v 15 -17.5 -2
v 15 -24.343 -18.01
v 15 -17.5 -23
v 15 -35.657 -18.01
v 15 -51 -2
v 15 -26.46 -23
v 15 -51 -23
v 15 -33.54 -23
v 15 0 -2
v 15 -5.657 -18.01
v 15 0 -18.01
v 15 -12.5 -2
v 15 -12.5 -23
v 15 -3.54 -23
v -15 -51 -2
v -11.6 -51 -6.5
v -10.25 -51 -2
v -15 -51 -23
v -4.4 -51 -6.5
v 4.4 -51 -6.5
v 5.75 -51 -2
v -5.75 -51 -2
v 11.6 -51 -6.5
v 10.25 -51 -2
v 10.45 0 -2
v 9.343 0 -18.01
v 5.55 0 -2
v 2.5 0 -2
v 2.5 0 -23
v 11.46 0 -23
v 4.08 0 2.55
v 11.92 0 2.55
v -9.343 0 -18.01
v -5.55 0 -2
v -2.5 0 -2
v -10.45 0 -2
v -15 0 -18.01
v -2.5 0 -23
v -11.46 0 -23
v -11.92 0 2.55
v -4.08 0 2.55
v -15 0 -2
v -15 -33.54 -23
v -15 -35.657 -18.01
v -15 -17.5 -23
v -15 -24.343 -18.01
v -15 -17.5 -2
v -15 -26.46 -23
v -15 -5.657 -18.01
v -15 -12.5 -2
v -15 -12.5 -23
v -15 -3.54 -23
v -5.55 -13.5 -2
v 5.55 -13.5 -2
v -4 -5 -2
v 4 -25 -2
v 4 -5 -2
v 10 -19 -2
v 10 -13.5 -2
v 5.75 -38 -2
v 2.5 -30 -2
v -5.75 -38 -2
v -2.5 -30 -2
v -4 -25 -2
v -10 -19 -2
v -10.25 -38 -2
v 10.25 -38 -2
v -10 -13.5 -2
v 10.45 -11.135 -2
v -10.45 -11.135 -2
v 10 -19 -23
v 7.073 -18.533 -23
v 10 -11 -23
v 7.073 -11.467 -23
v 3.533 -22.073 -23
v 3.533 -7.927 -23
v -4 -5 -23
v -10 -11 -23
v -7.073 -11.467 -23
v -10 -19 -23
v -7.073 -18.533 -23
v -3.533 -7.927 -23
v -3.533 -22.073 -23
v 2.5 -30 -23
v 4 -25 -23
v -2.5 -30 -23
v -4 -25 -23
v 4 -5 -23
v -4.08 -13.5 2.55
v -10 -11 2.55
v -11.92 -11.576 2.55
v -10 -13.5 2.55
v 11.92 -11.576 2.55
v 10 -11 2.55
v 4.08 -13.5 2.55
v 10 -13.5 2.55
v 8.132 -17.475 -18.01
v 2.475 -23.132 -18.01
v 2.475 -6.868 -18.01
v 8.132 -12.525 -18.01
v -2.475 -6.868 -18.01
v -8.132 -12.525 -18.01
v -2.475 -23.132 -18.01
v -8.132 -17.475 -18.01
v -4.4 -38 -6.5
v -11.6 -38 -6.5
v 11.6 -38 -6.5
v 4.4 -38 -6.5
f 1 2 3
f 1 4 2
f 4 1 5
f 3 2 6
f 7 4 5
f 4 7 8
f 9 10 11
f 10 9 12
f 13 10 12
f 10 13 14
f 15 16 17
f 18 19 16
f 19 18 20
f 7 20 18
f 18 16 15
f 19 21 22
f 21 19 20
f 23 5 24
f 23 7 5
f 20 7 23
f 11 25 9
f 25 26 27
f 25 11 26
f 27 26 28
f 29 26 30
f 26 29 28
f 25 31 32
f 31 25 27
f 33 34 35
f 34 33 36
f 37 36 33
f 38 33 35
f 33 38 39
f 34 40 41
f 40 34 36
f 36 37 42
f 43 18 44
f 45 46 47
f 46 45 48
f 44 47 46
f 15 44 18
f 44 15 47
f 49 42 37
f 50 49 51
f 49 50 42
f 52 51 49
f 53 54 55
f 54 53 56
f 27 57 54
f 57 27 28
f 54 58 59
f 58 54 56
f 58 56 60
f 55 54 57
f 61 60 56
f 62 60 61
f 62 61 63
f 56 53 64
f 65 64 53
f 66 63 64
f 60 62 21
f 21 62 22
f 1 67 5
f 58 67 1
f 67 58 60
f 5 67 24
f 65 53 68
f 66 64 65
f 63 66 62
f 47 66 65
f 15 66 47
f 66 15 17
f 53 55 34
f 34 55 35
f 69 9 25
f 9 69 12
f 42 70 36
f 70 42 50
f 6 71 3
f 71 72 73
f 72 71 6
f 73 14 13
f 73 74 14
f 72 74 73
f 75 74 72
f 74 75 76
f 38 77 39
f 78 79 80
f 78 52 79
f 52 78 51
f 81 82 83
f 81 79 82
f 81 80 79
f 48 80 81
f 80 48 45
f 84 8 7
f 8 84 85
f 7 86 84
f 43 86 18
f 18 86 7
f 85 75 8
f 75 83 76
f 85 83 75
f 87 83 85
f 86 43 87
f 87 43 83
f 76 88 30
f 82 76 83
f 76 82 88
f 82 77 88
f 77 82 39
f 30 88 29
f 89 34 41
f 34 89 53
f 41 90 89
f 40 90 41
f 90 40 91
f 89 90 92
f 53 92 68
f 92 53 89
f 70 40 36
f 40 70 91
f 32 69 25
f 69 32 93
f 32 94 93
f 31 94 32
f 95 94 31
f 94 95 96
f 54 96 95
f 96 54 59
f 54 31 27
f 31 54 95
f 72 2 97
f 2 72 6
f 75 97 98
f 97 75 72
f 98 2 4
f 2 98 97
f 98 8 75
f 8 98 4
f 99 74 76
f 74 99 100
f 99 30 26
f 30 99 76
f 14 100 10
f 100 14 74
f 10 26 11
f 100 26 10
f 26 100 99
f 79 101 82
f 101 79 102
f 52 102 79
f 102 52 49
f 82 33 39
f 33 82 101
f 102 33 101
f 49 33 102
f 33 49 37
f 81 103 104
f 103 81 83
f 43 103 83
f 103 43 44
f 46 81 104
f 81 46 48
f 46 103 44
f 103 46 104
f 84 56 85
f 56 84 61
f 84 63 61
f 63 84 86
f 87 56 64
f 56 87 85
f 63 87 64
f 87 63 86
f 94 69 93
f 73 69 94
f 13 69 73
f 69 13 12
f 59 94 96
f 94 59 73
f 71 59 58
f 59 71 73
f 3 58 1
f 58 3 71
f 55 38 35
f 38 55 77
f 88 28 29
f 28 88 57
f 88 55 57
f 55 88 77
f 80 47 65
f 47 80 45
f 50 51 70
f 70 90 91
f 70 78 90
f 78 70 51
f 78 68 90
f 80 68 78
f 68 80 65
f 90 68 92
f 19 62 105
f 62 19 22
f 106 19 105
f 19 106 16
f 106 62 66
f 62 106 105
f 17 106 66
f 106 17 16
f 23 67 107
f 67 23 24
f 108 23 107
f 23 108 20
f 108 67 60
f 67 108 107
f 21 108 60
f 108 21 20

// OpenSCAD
// file: ../../include.scad
//////////////////      END SECTION       //////////////////

	module added_pins(){
		difference(){
			union(){
				translate([30/(15/4),obj_leg*leg_length,30/(15/4)]) pin();
				translate([30/(15/4)+14.5,obj_leg*leg_length,30/(15/4)+14]) pin();
			}
			union(){
							translate([30/(15/4)+13.5,obj_leg*leg_length-20,30/(15/4)+5])cube(size=[2,40,15]);
							translate([30/(15/4)+7.5,obj_leg*leg_length-20,30/(15/4)+15])rotate([0,90,0]) cube(size=[2,40,15]);	

							translate([30/(15/4)-1,obj_leg*leg_length-20,30/(15/4)-8])cube(size=[2,40,15]);
							translate([30/(15/4)-10,obj_leg*leg_length-20,30/(15/4)+1])rotate([0,90,0]) cube(size=[2,40,15]);
			}
		}
	}
	module taken_pins() {
		translate([30/(15/4)+14,obj_leg*leg_length-10,30/(15/4)]) mirror_pin();
		translate([30/(15/4),obj_leg*leg_length-10,30/(15/4)+15]) mirror_pin();
	}


//////////////////      OTHER STUFF       //////////////////

	module holes() {
		rotate([0,0,90]) for(y=[0:other_holes])
		translate([obj_leg+y*15,-15.5,7.5]) union() {
			translate([7.5,0,15]) hole_up();
			hole_down();
		}
	}
	module extend_holes() {
	module top(){
		rotate([0,0,90]) for(y=[0:other_holes+1])
		translate([(30/4)+y*15,-15.5,7.5]) union() {
			translate([7.5,0,15]) hole_up();
		}
	}
	module bottom(){
		rotate([0,0,90]) for(y=[0:other_holes+2])
		translate([(30/4)+y*15,-15.5,7.5]) union() {
			hole_down();
		
}
	}
	union(){
		top();
		bottom();
	}
	}

	module hole() {
		union() {
			rotate([90, 90, 0]) cylinder(h=40, d=hole_pin_diameter, center=true);
			translate([0,7.5,0]) sphere(d=hole_ball_size);
			translate([0,-6,0]) sphere(d=hole_ball_size);
		}
	}
	module hole_up() {
		union() {
			rotate([90, 90, 0]) cylinder(h=40, d=hole_pin_diameter, center=true);
			translate([0,7.5,10]) cylinder(h=hole_pin_height, d=hole_pin_diameter, center=true);
			translate([0,-6,10]) cylinder(h=hole_pin_height, d=hole_pin_diameter, center=true);
			translate([0,7.5,0]) sphere(d=hole_ball_size);
			translate([0,-6,0]) sphere(d=hole_ball_size);
		}
	}
	module hole_down() {
		union() {
			rotate([90, 90, 0]) cylinder(h=40, d=hole_pin_diameter, center=true);
			translate([0,7.5,-10]) cylinder(h=hole_pin_height, d=hole_pin_diameter, center=true);
			translate([0,-6,-10]) cylinder(h=hole_pin_height, d=hole_pin_diameter, center=true);
			translate([0,7.5,0]) sphere(d=hole_ball_size);
			translate([0,-6,0]) sphere(d=hole_ball_size);
		}
	}
	module pin() {
		union() {
			rotate([90, 90, 0]) cylinder(h=pin_height, d=pin_diameter, center=true);
			translate([0,7.5,0]) sphere(d=ball_size);
		}
	}

	module mirror_pin() {
		rotate([90, 90, 0]) cylinder(h=hole_pin_height+small_number, d=hole_pin_diameter, center=true);
		translate([0,-(pin_height-(ball_size/2)),0]) sphere(d=ball_size);
	}


//////////////////      SOME RACK AND Z THINGS       //////////////////

module z_holes() {
    rotate([0,-90,0]) for(z=[0:z_hole_number])
    translate([22.5+z*15,16,-12])
        hole();
}

module pin_cuts() {
	union(){
		cube(size=[2,10,40], center=true);
		rotate([0,0,90]) cube(size=[2,10,40], center=true);
	}
}
module pin_uncut() {
	union(){
		rotate([0, 0, 90]) cylinder(h=hole_pin_height, d=hole_pin_diameter, center=true);
		translate([0,0,10]) sphere(d=ball_hole);
	}
}


module pin_out() {
	union(){
		rotate([0, 0, 90]) cylinder(h=pin_height, d=pin_diameter, center=true);
		translate([0,0,10]) sphere(d= ball_size);
	}
}


module pins_z(){
	difference() {
		pin_out();
		pin_cuts();
	}
}
//////////////////      RACK AND SLIDE     ///////////////////

module straight_pins() {
	for(z=[0:((((obj_leg*leg_length)*2)-(obj_leg*2))/3)/14.5]) rotate([-90,0,0]) translate([z*15,30/(15/4),14]) pins_z();
	for(z=[0:((((obj_leg*leg_length)*2)-(obj_leg*2))/3)/14.5]) rotate([-90,0,0]) translate([z*15,30/(15/4)-14,14]) pins_z();
}
module stagger_pins() {
	for(z=[0:((((obj_leg*leg_length)*2)-(obj_leg*2))/3)/14.5]) rotate([-90,0,0]) translate([z*15,30/(15/4),14]) pins_z();
	for(z=[0:((((obj_leg*leg_length)*2)-(obj_leg*2))/3)/14.5]) rotate([-90,0,0]) translate([z*15+7,30/(15/4)-14,14]) pins_z();
}


//////////////////      DOVE TAIL       //////////////////

module male_dovetail(height) {
	dovetail_3d(max_width,min_width,depth,height);
}

module dovetail_3d(max_width=11, min_width=5, depth=5, height=30) {
	linear_extrude(height=height, convexity=2)
		dovetail_2d(max_width,min_width,depth);
}

module dovetail_2d(max_width=11, min_width=5, depth=5) {
	angle=atan((max_width/2-min_width/2)/depth);
	echo("angle: ", angle);
	polygon(paths=[[0,1,2,3,0]], points=[[-min_width/2,0], [-max_width/2,depth], [max_width/2, depth], [min_width/2,0]]);
}

//bow tie
	module tie_end(height){
				rotate([0,0,0]) translate([0,-0.01,((obj_leg/2)/2)]) male_dovetail(height);
				rotate([0,90,0]) translate([0,-0.01,((obj_leg/2)/2)]) male_dovetail(height);
				rotate([0,180,0]) translate([0,-0.01,((obj_leg/2)/2)]) male_dovetail(height);
				rotate([0,-90,0]) translate([0,-0.01,((obj_leg/2)/2)]) male_dovetail(height);
	}

module bow_support(){
	difference(){
		intersection(){
			translate([-15,0,-15]) cube([30,9,30]);
			scale([1.05,1.05,1.05]) rotate([0,45,0]) tie_end();
		}
		cube([29.2,29.2,29.2], center=true);
	}
}

	module wrap(units){
	for (y = [-1:units-2]) // two iterations, z = -1, z = 1
	{
			translate([15, (y*30)+15, 15]){
			for (r = [0:4]) // two iterations, z = -1, z = 1
			{
				rotate([0,r*90,0]) translate([0,15,15]) rotate([-90,0,0])male_dovetail(height=30);
			}
		}
	}
	}
// file: ../../globals.scad
/*
Most things in this file is represented as one millimeter, so keep that in mind while changing things.
Some of the setting are not mm but at variables that you can set, such as 2*x=2x and you are setting what x is.
I will try to specify when things are variables and not exact measurements.
*/

//Virindi settings
dovetail_male_width_scale = 0.98;
dovetail_male_height_scale = 0.91;

obj_leg = 30;
leg_length = 5.5;
small_number = 0.001;
metal_core_rode_global = 5;


///////////////// number of holes /////////////////////
z_hole_number = 8;
other_holes = 8;

///////////////// Pins /////////////////////

//pins that poke out
ball_size = 10;
pin_height = 20;
pin_diameter = 6;


//holes
hole_ball_size = ball_size;
hole_pin_height = pin_height;
hole_pin_diameter = pin_diameter;

///////////////// Z THINGS /////////////////////

berring_slot_width = 7.5;
berring_slot_depth = 6.5;
metal_core_rode = 5;

///////////////// X THINGS /////////////////////

//male dove tails
max_width=8;
min_width=5;
depth=5;
height=obj_leg/2;

//female dove tails, this is found on the y mounts
girl_max_width=11;
girl_min_width=5;
girl_depth=5;
girl_height=obj_leg;


///////////////// Y THINGS /////////////////////
/*
The Y is so normal that all of those global variables at the top should change all of the setting in it, this section is set her incase there are variables set in the future development of this project.
*/
// main file
include <../../globals.scad>;
include <../../include.scad>;

tail_depth = 55;
tail_depth_2 = -10;
thickness = 21;
module y_mount_added(){
	translate([0,-15+6-3.5,51/2]) cube([30,thickness,51], center=true);
    
    translate([-8,-12.5+thickness/2,-55+tail_depth]) scale([dovetail_male_width_scale, dovetail_male_height_scale, 0.9]) male_dovetail(height=15);
	translate([8,-12.5+thickness/2,-55+tail_depth]) scale([dovetail_male_width_scale, dovetail_male_height_scale, 0.9]) male_dovetail(height=15);
    

}

module y_mount_taken(){
	translate([0,-thickness/2-12.5,15]) rotate([0,45,0]) tie_end();
    
	rotate([180,0,0]) translate([-8,12.5-thickness/2,-55+tail_depth_2]) scale([.9,.9,.9]) male_dovetail(height=30);
	rotate([180,0,0]) translate([8,12.5-thickness/2,-55+tail_depth_2]) scale([.9,.9,.9]) male_dovetail(height=30);
translate([-15,-45,0]) wrap(3);
}
/*
rotate([90,0,0]) difference(){
	translate([0,-thickness/2-12.5,15]) bow_support();
	translate([0,-thickness/2-12.5,25]) cube([50,10,20], center=true);
	translate([0,-thickness/2-12.5,0]) cube([31,10,20], center=true);
}
*/

module x_spacer()
{
rotate([90,0,0]) difference(){
	y_mount_added();
	y_mount_taken();
}
}

x_spacer();
